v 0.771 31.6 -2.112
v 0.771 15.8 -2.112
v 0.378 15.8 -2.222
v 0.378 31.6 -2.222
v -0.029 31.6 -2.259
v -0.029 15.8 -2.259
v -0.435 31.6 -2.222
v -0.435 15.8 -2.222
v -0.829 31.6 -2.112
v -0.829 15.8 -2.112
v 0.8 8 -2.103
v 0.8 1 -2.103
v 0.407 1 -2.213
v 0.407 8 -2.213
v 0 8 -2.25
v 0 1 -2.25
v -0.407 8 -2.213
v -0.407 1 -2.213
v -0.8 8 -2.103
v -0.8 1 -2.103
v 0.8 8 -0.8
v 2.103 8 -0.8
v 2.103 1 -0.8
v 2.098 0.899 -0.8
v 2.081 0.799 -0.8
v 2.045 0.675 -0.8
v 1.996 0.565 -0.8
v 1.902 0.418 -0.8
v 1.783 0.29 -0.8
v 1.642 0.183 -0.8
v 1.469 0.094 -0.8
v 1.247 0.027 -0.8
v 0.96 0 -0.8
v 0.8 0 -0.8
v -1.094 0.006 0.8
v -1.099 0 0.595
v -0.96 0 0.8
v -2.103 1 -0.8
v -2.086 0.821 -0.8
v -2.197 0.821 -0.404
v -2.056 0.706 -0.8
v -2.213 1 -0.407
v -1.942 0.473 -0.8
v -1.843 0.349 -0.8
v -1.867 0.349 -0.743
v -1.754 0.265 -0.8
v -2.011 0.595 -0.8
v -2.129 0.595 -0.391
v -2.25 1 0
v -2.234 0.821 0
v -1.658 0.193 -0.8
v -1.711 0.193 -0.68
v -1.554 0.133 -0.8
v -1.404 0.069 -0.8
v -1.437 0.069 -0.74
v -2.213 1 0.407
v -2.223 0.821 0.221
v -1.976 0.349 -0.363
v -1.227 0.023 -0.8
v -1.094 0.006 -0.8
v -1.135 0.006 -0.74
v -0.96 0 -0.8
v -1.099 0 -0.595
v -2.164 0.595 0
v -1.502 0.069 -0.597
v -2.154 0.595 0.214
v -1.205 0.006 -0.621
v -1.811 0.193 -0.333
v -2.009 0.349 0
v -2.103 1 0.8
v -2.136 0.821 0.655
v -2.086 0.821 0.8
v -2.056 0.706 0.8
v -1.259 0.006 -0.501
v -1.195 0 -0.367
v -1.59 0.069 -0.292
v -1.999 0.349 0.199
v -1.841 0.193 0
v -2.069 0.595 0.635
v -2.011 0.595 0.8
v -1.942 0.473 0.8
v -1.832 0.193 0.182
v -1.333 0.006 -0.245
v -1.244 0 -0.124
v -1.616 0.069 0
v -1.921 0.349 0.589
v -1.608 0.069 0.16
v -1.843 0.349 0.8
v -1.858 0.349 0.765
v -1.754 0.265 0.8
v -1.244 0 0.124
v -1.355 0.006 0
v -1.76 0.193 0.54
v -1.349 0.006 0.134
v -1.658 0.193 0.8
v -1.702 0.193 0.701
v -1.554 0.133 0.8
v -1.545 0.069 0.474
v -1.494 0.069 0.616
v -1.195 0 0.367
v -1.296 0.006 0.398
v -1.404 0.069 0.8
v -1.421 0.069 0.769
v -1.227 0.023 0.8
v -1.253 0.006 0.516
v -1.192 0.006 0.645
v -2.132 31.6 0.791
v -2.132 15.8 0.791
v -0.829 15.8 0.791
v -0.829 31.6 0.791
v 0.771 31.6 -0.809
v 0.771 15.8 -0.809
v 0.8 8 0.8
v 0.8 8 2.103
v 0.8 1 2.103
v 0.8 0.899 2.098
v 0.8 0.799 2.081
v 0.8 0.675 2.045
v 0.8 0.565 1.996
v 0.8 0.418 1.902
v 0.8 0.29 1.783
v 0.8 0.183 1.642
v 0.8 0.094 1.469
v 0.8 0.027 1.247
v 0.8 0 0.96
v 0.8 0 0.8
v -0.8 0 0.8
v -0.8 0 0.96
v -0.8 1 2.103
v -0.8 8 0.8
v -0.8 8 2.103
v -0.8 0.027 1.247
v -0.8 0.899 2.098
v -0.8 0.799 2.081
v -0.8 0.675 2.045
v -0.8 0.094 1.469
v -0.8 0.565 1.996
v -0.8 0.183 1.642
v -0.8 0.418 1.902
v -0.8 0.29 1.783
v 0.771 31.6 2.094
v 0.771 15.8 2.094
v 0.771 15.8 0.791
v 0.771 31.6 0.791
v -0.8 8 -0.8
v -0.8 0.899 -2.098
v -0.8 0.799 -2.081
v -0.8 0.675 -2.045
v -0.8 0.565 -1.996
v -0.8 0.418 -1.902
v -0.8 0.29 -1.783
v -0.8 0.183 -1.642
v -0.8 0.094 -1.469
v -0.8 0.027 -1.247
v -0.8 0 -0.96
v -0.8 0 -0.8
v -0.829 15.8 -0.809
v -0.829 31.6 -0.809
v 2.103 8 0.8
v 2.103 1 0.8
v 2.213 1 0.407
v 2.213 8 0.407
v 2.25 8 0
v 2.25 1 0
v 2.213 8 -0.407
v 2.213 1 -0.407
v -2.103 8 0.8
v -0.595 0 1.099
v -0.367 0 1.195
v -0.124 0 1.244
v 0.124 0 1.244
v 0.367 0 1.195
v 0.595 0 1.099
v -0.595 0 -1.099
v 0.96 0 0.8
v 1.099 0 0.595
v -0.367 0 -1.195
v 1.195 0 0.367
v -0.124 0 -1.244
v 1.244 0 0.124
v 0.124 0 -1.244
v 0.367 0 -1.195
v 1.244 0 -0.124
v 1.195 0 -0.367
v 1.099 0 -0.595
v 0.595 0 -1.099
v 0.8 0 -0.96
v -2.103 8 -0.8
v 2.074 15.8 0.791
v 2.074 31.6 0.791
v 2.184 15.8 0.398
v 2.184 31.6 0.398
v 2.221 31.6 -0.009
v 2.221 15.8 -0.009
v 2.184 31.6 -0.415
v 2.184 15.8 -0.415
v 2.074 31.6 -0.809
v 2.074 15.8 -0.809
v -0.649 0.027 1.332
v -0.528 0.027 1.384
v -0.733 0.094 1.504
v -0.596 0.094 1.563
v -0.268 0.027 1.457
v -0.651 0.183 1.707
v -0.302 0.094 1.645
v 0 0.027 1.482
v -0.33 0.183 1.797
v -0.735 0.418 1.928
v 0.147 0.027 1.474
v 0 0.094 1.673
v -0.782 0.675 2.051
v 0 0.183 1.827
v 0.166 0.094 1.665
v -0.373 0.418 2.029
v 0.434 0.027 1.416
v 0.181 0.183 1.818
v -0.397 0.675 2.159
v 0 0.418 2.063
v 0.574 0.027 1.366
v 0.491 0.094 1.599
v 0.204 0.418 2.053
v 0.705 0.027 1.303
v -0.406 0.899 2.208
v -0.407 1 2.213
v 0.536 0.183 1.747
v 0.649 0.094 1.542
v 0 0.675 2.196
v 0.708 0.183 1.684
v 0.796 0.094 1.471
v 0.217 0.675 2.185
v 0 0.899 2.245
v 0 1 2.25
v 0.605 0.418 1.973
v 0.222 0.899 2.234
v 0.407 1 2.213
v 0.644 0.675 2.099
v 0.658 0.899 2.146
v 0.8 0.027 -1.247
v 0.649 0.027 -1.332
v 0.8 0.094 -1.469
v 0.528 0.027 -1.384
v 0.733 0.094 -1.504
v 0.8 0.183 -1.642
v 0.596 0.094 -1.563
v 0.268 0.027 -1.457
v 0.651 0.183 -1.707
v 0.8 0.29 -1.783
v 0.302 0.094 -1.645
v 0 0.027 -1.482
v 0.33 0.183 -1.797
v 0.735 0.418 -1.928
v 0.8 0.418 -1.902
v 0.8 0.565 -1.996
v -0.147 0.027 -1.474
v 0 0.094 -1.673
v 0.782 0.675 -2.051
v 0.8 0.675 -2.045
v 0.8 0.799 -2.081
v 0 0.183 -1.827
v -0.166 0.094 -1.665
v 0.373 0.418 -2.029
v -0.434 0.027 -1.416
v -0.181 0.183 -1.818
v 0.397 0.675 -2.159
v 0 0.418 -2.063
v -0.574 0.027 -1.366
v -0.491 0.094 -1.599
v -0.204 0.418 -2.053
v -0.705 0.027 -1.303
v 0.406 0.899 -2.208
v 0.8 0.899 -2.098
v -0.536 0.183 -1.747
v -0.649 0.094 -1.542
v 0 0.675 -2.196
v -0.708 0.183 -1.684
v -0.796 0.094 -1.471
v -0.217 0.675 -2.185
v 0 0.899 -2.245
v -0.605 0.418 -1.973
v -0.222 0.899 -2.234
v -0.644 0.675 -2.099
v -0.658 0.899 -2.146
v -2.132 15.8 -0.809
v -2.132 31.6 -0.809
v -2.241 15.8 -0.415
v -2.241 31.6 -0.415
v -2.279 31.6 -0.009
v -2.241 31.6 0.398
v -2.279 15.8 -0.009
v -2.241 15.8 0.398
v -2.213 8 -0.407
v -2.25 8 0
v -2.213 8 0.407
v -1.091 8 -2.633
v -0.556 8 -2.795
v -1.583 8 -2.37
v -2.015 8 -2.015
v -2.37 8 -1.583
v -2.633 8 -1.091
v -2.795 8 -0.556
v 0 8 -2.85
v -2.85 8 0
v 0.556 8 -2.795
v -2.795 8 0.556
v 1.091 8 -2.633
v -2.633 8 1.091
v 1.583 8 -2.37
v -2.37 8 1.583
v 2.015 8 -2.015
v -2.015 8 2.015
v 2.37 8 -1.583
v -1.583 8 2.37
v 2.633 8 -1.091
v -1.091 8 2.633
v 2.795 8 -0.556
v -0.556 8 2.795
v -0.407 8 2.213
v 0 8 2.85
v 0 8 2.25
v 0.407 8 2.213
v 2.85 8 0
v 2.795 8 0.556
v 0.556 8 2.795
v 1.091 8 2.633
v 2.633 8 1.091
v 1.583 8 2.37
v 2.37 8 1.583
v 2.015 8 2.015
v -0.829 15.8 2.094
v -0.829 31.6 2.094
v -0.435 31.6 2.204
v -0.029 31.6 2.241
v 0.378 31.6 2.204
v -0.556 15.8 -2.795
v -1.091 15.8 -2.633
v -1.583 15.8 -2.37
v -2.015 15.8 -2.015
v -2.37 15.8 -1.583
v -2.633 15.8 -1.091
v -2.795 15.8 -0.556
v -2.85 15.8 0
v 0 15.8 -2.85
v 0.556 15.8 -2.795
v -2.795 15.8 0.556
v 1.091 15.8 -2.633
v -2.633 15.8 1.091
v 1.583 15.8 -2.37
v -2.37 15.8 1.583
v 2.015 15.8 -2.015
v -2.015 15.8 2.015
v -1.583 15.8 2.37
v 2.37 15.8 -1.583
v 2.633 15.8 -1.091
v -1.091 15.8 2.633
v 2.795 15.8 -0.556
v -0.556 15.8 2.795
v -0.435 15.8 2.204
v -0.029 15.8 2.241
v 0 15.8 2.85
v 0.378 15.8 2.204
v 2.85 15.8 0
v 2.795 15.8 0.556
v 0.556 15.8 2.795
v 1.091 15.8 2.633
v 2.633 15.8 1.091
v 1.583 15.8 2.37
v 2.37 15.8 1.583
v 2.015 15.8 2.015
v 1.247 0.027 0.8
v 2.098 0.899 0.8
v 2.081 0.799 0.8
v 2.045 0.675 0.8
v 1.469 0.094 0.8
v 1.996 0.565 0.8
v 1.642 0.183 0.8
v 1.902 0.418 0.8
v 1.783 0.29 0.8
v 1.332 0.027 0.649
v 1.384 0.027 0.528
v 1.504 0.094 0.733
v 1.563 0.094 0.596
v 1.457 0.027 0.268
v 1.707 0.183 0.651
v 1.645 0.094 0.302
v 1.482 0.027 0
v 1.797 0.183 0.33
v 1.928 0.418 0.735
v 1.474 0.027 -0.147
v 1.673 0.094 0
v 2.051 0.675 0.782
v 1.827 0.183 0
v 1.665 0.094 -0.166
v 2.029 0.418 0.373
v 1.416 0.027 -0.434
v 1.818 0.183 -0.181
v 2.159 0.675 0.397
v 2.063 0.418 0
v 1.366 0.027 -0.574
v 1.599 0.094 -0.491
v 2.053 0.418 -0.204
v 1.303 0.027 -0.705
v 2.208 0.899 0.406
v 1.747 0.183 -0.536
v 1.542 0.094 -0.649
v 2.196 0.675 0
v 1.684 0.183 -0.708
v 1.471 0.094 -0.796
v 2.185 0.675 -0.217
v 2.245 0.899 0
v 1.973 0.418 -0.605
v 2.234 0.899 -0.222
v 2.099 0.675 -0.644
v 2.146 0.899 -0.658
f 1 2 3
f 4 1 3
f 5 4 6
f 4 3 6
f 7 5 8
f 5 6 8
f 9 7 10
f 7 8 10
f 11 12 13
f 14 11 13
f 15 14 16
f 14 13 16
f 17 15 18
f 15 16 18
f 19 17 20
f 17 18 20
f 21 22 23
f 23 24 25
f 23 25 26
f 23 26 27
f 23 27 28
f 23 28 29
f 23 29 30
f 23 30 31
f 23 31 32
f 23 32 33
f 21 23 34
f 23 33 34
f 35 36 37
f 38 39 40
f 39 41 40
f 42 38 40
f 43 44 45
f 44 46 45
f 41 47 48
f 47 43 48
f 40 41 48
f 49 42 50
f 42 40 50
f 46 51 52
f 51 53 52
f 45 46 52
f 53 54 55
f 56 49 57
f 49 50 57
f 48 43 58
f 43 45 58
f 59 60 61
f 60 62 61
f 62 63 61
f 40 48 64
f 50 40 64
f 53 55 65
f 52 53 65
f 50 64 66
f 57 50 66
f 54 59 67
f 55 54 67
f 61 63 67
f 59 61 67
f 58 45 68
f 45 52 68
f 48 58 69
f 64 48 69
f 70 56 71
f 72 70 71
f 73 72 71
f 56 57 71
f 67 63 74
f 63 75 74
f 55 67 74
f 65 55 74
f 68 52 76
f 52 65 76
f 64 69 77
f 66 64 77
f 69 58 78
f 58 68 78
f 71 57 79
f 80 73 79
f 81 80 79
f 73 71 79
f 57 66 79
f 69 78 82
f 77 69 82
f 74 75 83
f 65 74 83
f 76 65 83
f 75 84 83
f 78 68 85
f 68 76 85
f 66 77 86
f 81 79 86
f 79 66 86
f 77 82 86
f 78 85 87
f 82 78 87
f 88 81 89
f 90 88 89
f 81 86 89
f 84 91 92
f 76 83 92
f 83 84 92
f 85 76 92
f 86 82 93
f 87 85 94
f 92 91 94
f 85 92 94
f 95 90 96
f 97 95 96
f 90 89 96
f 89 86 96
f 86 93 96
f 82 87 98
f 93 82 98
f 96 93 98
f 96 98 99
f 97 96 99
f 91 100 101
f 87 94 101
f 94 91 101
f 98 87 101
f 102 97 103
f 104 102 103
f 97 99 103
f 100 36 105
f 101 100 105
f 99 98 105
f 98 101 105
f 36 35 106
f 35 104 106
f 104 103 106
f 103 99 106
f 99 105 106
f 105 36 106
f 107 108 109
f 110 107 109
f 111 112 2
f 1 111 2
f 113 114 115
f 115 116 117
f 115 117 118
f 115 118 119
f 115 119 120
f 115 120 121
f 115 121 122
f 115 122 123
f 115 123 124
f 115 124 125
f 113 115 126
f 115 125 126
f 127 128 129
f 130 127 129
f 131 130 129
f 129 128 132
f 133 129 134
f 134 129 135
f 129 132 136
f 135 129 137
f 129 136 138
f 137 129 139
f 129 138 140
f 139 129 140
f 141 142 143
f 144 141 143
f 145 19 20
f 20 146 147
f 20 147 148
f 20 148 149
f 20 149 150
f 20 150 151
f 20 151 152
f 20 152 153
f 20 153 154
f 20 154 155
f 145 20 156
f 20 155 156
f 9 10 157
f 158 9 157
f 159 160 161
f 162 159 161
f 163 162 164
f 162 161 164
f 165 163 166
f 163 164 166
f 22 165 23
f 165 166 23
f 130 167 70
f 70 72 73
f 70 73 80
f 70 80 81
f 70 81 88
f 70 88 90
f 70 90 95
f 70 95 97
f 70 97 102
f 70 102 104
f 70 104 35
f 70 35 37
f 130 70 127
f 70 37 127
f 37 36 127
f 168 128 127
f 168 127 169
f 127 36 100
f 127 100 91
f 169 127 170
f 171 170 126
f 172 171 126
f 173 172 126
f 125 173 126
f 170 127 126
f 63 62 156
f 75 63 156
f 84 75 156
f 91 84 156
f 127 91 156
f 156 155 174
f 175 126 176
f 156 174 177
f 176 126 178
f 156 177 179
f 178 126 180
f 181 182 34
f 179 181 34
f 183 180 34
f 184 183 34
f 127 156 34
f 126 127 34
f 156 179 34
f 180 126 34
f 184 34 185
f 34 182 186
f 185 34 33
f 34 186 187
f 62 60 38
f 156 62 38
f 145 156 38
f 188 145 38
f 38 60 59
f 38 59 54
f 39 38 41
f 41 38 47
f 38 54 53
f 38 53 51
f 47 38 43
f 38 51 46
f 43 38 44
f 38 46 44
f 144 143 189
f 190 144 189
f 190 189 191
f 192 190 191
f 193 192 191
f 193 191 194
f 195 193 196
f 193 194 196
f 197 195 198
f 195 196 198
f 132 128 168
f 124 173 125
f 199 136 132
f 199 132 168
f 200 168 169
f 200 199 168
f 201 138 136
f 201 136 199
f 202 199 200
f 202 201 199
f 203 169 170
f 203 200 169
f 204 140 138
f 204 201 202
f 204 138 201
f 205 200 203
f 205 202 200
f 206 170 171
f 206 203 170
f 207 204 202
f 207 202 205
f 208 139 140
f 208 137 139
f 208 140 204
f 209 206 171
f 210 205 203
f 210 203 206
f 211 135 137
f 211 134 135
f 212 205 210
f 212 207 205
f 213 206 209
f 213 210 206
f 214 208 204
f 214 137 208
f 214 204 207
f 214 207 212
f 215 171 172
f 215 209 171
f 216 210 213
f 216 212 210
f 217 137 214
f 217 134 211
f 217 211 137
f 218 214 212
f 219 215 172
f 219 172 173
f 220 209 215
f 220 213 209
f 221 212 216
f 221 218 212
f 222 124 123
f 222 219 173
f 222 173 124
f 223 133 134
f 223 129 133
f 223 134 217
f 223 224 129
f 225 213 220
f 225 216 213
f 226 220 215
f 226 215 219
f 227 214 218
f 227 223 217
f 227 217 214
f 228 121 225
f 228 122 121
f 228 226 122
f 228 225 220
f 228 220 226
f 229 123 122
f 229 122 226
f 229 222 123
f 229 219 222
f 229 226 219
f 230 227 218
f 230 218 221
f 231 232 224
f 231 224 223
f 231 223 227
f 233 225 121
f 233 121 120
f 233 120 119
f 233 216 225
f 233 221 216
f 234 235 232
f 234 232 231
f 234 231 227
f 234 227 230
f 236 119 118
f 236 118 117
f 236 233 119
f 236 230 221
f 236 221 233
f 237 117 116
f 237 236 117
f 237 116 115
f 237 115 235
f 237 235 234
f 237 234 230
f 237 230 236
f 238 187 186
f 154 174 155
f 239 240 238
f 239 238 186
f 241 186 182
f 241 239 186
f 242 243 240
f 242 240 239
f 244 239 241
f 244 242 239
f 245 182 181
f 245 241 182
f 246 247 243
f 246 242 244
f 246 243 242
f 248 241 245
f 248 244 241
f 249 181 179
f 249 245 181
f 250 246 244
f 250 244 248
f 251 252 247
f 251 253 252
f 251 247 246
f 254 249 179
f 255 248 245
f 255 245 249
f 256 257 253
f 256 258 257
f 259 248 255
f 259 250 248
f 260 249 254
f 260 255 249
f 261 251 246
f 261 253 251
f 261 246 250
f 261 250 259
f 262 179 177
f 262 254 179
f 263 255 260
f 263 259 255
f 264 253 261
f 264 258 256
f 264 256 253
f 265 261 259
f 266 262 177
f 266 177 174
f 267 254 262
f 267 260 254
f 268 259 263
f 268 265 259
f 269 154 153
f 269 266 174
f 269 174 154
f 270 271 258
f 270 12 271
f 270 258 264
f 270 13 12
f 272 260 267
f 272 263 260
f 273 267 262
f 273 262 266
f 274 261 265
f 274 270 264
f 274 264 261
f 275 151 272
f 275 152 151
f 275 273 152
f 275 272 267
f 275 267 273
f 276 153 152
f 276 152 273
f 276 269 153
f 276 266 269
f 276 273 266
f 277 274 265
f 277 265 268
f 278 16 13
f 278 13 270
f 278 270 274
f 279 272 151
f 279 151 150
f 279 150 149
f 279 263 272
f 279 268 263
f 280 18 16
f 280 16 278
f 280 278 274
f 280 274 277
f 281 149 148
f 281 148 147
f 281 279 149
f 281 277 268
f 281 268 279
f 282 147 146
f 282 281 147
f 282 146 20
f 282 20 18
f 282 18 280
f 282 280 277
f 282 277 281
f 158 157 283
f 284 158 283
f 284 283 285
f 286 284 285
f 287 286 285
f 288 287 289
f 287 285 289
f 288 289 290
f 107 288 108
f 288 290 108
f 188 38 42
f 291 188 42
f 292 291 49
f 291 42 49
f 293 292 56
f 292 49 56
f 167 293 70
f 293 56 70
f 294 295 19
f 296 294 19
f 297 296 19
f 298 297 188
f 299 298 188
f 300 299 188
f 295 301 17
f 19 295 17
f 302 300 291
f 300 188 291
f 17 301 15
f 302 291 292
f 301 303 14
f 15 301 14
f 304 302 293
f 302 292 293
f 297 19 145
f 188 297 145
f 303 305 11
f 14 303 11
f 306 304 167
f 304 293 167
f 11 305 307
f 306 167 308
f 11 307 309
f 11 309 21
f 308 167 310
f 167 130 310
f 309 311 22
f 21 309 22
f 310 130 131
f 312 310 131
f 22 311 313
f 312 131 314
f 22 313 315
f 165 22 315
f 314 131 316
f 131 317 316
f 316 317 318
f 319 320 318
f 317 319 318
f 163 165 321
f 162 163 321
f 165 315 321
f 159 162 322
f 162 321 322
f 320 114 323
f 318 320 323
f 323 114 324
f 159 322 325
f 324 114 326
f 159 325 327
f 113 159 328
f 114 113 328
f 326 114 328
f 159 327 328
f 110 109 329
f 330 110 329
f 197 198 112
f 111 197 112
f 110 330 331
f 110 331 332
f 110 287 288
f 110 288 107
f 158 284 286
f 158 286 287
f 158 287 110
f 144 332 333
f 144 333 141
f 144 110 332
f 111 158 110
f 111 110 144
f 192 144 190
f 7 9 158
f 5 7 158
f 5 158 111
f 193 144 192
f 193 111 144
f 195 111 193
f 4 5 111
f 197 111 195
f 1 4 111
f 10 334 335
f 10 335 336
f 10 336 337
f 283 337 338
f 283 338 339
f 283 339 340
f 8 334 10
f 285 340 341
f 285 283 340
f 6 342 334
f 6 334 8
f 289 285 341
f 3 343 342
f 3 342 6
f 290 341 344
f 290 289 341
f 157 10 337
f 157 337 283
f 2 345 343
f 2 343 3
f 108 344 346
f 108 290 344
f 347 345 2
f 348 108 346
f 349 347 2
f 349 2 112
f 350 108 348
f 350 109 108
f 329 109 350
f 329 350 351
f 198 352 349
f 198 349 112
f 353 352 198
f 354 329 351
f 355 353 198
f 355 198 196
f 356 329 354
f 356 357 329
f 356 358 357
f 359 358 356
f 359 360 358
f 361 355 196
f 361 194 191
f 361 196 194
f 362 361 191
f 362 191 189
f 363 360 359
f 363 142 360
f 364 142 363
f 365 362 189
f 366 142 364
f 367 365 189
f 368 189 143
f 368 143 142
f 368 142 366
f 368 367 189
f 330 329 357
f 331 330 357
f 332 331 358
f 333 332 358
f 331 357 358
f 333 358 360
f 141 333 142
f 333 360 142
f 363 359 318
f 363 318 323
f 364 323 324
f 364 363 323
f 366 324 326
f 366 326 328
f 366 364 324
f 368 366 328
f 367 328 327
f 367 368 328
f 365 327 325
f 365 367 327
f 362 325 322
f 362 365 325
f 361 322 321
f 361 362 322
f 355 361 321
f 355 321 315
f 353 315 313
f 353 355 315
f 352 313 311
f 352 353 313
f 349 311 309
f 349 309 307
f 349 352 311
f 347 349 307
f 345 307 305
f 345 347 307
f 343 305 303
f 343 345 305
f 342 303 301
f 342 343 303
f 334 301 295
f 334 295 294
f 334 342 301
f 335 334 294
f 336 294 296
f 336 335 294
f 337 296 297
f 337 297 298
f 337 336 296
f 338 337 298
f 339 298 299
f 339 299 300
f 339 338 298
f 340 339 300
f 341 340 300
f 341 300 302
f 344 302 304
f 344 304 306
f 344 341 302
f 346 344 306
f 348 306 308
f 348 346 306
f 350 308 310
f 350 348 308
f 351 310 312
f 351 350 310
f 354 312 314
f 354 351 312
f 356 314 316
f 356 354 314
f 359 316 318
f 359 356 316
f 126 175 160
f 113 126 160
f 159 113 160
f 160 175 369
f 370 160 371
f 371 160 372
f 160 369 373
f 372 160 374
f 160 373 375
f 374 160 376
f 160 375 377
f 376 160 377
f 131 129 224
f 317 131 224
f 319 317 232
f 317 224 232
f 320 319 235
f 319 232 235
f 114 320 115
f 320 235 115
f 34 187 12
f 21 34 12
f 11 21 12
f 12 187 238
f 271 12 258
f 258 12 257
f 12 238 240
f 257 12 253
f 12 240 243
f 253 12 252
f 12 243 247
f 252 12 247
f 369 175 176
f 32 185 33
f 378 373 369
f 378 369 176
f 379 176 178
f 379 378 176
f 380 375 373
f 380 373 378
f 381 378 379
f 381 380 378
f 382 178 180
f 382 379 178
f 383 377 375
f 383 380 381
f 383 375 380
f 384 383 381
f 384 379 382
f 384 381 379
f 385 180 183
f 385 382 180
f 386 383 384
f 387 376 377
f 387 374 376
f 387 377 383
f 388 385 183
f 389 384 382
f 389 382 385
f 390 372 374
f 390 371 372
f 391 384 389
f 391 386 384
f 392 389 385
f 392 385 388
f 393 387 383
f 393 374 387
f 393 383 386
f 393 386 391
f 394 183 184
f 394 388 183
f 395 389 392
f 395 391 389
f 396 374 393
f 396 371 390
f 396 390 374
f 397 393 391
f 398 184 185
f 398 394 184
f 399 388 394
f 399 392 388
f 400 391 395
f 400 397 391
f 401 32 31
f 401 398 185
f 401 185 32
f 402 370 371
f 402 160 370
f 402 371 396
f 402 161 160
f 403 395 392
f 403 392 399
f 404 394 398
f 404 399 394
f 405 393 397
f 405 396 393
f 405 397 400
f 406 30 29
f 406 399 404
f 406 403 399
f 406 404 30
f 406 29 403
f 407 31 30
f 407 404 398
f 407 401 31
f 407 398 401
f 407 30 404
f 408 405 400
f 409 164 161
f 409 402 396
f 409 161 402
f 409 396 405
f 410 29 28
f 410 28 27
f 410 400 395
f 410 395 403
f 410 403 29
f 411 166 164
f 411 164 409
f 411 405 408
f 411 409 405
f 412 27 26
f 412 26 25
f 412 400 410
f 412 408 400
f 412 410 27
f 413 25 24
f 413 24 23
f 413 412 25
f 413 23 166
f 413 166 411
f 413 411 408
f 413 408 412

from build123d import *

# Parameters (mm, degrees)
BOSS_EXTRUDE1_DEPTH = 15.8
FILLET1_R           = 1
FILLET2_R           = 1
FILLET3_R           = 1
FILLET4_R           = 1
SKETCH3_R           = 2.85
BOSS_EXTRUDE2_DEPTH = 7.8
BOSS_EXTRUDE4_DEPTH = 15.8


with BuildPart() as part:
    # Sketch1 → Boss-Extrude1 (new body)
    with BuildSketch(Plane(origin=(0, 0, 0), x_dir=(1, 0, 0), z_dir=(0, 1, 0))):
        with BuildLine():
            Line((-0.8, -0.8), (-0.8, -2.102974084))
            ThreePointArc((-0.8, -2.102974084), (0, -2.25), (0.8, -2.102974084))
            Line((0.8, -2.102974084), (0.8, -0.8))
            Line((0.8, -0.8), (2.102974084, -0.8))
            ThreePointArc((2.102974084, -0.8), (2.25, 0), (2.102974084, 0.8))
            Line((2.102974084, 0.8), (0.8, 0.8))
            Line((0.8, 0.8), (0.8, 2.102974084))
            ThreePointArc((0.8, 2.102974084), (0, 2.25), (-0.8, 2.102974084))
            Line((-0.8, 2.102974084), (-0.8, 0.8))
            Line((-0.8, 0.8), (-2.102974084, 0.8))
            ThreePointArc((-2.102974084, 0.8), (-2.25, 0), (-2.102974084, -0.8))
            Line((-2.102974084, -0.8), (-0.8, -0.8))
        make_face()
    extrude(amount=BOSS_EXTRUDE1_DEPTH)

    # Fillet1
    fillet1_edges = [part.edges().sort_by_distance(p)[0] for p in [
        (-2.25, 0, 0),
    ]]
    fillet(fillet1_edges, radius=FILLET1_R)

    # Fillet2
    fillet2_edges = [part.edges().sort_by_distance(p)[0] for p in [
        (0, 0, 2.25),
    ]]
    fillet(fillet2_edges, radius=FILLET2_R)

    # Fillet3
    fillet3_edges = [part.edges().sort_by_distance(p)[0] for p in [
        (2.25, 0, 0),
    ]]
    fillet(fillet3_edges, radius=FILLET3_R)

    # Fillet4
    fillet4_edges = [part.edges().sort_by_distance(p)[0] for p in [
        (0, 0, -2.25),
    ]]
    fillet(fillet4_edges, radius=FILLET4_R)

    # Sketch3 → Boss-Extrude2 (add)
    with BuildSketch(Plane(origin=(0, 15.8, 0), x_dir=(1, 0, 0), z_dir=(0, 1, 0))):
        with Locations(Location((0, 0, 0), (0, 0, 270))):
            Circle(SKETCH3_R)
    extrude(amount=-BOSS_EXTRUDE2_DEPTH)

    # Sketch6 → Boss-Extrude4 (add)
    with BuildSketch(Plane(origin=(0, 15.8, 0), x_dir=(1, 0, 0), z_dir=(0, 1, 0))):
        with BuildLine():
            Line((-0.82856076, -0.791213071), (-0.82856076, -2.094187155))
            ThreePointArc((-0.82856076, -2.094187155), (-0.02856076, -2.241213071), (0.77143924, -2.094187155))
            Line((0.77143924, -2.094187155), (0.77143924, -0.791213071))
            Line((0.77143924, -0.791213071), (2.074413324, -0.791213071))
            ThreePointArc((2.074413324, -0.791213071), (2.22143924, 0.008786929), (2.074413324, 0.808786929))
            Line((2.074413324, 0.808786929), (0.77143924, 0.808786929))
            Line((0.77143924, 0.808786929), (0.77143924, 2.111761014))
            ThreePointArc((0.77143924, 2.111761014), (-0.02856076, 2.258786929), (-0.82856076, 2.111761014))
            Line((-0.82856076, 2.111761014), (-0.82856076, 0.808786929))
            Line((-0.82856076, 0.808786929), (-2.131534845, 0.808786929))
            ThreePointArc((-2.131534845, 0.808786929), (-2.27856076, 0.008786929), (-2.131534845, -0.791213071))
            Line((-2.131534845, -0.791213071), (-0.82856076, -0.791213071))
        make_face()
    extrude(amount=BOSS_EXTRUDE4_DEPTH)


solid = part.part
